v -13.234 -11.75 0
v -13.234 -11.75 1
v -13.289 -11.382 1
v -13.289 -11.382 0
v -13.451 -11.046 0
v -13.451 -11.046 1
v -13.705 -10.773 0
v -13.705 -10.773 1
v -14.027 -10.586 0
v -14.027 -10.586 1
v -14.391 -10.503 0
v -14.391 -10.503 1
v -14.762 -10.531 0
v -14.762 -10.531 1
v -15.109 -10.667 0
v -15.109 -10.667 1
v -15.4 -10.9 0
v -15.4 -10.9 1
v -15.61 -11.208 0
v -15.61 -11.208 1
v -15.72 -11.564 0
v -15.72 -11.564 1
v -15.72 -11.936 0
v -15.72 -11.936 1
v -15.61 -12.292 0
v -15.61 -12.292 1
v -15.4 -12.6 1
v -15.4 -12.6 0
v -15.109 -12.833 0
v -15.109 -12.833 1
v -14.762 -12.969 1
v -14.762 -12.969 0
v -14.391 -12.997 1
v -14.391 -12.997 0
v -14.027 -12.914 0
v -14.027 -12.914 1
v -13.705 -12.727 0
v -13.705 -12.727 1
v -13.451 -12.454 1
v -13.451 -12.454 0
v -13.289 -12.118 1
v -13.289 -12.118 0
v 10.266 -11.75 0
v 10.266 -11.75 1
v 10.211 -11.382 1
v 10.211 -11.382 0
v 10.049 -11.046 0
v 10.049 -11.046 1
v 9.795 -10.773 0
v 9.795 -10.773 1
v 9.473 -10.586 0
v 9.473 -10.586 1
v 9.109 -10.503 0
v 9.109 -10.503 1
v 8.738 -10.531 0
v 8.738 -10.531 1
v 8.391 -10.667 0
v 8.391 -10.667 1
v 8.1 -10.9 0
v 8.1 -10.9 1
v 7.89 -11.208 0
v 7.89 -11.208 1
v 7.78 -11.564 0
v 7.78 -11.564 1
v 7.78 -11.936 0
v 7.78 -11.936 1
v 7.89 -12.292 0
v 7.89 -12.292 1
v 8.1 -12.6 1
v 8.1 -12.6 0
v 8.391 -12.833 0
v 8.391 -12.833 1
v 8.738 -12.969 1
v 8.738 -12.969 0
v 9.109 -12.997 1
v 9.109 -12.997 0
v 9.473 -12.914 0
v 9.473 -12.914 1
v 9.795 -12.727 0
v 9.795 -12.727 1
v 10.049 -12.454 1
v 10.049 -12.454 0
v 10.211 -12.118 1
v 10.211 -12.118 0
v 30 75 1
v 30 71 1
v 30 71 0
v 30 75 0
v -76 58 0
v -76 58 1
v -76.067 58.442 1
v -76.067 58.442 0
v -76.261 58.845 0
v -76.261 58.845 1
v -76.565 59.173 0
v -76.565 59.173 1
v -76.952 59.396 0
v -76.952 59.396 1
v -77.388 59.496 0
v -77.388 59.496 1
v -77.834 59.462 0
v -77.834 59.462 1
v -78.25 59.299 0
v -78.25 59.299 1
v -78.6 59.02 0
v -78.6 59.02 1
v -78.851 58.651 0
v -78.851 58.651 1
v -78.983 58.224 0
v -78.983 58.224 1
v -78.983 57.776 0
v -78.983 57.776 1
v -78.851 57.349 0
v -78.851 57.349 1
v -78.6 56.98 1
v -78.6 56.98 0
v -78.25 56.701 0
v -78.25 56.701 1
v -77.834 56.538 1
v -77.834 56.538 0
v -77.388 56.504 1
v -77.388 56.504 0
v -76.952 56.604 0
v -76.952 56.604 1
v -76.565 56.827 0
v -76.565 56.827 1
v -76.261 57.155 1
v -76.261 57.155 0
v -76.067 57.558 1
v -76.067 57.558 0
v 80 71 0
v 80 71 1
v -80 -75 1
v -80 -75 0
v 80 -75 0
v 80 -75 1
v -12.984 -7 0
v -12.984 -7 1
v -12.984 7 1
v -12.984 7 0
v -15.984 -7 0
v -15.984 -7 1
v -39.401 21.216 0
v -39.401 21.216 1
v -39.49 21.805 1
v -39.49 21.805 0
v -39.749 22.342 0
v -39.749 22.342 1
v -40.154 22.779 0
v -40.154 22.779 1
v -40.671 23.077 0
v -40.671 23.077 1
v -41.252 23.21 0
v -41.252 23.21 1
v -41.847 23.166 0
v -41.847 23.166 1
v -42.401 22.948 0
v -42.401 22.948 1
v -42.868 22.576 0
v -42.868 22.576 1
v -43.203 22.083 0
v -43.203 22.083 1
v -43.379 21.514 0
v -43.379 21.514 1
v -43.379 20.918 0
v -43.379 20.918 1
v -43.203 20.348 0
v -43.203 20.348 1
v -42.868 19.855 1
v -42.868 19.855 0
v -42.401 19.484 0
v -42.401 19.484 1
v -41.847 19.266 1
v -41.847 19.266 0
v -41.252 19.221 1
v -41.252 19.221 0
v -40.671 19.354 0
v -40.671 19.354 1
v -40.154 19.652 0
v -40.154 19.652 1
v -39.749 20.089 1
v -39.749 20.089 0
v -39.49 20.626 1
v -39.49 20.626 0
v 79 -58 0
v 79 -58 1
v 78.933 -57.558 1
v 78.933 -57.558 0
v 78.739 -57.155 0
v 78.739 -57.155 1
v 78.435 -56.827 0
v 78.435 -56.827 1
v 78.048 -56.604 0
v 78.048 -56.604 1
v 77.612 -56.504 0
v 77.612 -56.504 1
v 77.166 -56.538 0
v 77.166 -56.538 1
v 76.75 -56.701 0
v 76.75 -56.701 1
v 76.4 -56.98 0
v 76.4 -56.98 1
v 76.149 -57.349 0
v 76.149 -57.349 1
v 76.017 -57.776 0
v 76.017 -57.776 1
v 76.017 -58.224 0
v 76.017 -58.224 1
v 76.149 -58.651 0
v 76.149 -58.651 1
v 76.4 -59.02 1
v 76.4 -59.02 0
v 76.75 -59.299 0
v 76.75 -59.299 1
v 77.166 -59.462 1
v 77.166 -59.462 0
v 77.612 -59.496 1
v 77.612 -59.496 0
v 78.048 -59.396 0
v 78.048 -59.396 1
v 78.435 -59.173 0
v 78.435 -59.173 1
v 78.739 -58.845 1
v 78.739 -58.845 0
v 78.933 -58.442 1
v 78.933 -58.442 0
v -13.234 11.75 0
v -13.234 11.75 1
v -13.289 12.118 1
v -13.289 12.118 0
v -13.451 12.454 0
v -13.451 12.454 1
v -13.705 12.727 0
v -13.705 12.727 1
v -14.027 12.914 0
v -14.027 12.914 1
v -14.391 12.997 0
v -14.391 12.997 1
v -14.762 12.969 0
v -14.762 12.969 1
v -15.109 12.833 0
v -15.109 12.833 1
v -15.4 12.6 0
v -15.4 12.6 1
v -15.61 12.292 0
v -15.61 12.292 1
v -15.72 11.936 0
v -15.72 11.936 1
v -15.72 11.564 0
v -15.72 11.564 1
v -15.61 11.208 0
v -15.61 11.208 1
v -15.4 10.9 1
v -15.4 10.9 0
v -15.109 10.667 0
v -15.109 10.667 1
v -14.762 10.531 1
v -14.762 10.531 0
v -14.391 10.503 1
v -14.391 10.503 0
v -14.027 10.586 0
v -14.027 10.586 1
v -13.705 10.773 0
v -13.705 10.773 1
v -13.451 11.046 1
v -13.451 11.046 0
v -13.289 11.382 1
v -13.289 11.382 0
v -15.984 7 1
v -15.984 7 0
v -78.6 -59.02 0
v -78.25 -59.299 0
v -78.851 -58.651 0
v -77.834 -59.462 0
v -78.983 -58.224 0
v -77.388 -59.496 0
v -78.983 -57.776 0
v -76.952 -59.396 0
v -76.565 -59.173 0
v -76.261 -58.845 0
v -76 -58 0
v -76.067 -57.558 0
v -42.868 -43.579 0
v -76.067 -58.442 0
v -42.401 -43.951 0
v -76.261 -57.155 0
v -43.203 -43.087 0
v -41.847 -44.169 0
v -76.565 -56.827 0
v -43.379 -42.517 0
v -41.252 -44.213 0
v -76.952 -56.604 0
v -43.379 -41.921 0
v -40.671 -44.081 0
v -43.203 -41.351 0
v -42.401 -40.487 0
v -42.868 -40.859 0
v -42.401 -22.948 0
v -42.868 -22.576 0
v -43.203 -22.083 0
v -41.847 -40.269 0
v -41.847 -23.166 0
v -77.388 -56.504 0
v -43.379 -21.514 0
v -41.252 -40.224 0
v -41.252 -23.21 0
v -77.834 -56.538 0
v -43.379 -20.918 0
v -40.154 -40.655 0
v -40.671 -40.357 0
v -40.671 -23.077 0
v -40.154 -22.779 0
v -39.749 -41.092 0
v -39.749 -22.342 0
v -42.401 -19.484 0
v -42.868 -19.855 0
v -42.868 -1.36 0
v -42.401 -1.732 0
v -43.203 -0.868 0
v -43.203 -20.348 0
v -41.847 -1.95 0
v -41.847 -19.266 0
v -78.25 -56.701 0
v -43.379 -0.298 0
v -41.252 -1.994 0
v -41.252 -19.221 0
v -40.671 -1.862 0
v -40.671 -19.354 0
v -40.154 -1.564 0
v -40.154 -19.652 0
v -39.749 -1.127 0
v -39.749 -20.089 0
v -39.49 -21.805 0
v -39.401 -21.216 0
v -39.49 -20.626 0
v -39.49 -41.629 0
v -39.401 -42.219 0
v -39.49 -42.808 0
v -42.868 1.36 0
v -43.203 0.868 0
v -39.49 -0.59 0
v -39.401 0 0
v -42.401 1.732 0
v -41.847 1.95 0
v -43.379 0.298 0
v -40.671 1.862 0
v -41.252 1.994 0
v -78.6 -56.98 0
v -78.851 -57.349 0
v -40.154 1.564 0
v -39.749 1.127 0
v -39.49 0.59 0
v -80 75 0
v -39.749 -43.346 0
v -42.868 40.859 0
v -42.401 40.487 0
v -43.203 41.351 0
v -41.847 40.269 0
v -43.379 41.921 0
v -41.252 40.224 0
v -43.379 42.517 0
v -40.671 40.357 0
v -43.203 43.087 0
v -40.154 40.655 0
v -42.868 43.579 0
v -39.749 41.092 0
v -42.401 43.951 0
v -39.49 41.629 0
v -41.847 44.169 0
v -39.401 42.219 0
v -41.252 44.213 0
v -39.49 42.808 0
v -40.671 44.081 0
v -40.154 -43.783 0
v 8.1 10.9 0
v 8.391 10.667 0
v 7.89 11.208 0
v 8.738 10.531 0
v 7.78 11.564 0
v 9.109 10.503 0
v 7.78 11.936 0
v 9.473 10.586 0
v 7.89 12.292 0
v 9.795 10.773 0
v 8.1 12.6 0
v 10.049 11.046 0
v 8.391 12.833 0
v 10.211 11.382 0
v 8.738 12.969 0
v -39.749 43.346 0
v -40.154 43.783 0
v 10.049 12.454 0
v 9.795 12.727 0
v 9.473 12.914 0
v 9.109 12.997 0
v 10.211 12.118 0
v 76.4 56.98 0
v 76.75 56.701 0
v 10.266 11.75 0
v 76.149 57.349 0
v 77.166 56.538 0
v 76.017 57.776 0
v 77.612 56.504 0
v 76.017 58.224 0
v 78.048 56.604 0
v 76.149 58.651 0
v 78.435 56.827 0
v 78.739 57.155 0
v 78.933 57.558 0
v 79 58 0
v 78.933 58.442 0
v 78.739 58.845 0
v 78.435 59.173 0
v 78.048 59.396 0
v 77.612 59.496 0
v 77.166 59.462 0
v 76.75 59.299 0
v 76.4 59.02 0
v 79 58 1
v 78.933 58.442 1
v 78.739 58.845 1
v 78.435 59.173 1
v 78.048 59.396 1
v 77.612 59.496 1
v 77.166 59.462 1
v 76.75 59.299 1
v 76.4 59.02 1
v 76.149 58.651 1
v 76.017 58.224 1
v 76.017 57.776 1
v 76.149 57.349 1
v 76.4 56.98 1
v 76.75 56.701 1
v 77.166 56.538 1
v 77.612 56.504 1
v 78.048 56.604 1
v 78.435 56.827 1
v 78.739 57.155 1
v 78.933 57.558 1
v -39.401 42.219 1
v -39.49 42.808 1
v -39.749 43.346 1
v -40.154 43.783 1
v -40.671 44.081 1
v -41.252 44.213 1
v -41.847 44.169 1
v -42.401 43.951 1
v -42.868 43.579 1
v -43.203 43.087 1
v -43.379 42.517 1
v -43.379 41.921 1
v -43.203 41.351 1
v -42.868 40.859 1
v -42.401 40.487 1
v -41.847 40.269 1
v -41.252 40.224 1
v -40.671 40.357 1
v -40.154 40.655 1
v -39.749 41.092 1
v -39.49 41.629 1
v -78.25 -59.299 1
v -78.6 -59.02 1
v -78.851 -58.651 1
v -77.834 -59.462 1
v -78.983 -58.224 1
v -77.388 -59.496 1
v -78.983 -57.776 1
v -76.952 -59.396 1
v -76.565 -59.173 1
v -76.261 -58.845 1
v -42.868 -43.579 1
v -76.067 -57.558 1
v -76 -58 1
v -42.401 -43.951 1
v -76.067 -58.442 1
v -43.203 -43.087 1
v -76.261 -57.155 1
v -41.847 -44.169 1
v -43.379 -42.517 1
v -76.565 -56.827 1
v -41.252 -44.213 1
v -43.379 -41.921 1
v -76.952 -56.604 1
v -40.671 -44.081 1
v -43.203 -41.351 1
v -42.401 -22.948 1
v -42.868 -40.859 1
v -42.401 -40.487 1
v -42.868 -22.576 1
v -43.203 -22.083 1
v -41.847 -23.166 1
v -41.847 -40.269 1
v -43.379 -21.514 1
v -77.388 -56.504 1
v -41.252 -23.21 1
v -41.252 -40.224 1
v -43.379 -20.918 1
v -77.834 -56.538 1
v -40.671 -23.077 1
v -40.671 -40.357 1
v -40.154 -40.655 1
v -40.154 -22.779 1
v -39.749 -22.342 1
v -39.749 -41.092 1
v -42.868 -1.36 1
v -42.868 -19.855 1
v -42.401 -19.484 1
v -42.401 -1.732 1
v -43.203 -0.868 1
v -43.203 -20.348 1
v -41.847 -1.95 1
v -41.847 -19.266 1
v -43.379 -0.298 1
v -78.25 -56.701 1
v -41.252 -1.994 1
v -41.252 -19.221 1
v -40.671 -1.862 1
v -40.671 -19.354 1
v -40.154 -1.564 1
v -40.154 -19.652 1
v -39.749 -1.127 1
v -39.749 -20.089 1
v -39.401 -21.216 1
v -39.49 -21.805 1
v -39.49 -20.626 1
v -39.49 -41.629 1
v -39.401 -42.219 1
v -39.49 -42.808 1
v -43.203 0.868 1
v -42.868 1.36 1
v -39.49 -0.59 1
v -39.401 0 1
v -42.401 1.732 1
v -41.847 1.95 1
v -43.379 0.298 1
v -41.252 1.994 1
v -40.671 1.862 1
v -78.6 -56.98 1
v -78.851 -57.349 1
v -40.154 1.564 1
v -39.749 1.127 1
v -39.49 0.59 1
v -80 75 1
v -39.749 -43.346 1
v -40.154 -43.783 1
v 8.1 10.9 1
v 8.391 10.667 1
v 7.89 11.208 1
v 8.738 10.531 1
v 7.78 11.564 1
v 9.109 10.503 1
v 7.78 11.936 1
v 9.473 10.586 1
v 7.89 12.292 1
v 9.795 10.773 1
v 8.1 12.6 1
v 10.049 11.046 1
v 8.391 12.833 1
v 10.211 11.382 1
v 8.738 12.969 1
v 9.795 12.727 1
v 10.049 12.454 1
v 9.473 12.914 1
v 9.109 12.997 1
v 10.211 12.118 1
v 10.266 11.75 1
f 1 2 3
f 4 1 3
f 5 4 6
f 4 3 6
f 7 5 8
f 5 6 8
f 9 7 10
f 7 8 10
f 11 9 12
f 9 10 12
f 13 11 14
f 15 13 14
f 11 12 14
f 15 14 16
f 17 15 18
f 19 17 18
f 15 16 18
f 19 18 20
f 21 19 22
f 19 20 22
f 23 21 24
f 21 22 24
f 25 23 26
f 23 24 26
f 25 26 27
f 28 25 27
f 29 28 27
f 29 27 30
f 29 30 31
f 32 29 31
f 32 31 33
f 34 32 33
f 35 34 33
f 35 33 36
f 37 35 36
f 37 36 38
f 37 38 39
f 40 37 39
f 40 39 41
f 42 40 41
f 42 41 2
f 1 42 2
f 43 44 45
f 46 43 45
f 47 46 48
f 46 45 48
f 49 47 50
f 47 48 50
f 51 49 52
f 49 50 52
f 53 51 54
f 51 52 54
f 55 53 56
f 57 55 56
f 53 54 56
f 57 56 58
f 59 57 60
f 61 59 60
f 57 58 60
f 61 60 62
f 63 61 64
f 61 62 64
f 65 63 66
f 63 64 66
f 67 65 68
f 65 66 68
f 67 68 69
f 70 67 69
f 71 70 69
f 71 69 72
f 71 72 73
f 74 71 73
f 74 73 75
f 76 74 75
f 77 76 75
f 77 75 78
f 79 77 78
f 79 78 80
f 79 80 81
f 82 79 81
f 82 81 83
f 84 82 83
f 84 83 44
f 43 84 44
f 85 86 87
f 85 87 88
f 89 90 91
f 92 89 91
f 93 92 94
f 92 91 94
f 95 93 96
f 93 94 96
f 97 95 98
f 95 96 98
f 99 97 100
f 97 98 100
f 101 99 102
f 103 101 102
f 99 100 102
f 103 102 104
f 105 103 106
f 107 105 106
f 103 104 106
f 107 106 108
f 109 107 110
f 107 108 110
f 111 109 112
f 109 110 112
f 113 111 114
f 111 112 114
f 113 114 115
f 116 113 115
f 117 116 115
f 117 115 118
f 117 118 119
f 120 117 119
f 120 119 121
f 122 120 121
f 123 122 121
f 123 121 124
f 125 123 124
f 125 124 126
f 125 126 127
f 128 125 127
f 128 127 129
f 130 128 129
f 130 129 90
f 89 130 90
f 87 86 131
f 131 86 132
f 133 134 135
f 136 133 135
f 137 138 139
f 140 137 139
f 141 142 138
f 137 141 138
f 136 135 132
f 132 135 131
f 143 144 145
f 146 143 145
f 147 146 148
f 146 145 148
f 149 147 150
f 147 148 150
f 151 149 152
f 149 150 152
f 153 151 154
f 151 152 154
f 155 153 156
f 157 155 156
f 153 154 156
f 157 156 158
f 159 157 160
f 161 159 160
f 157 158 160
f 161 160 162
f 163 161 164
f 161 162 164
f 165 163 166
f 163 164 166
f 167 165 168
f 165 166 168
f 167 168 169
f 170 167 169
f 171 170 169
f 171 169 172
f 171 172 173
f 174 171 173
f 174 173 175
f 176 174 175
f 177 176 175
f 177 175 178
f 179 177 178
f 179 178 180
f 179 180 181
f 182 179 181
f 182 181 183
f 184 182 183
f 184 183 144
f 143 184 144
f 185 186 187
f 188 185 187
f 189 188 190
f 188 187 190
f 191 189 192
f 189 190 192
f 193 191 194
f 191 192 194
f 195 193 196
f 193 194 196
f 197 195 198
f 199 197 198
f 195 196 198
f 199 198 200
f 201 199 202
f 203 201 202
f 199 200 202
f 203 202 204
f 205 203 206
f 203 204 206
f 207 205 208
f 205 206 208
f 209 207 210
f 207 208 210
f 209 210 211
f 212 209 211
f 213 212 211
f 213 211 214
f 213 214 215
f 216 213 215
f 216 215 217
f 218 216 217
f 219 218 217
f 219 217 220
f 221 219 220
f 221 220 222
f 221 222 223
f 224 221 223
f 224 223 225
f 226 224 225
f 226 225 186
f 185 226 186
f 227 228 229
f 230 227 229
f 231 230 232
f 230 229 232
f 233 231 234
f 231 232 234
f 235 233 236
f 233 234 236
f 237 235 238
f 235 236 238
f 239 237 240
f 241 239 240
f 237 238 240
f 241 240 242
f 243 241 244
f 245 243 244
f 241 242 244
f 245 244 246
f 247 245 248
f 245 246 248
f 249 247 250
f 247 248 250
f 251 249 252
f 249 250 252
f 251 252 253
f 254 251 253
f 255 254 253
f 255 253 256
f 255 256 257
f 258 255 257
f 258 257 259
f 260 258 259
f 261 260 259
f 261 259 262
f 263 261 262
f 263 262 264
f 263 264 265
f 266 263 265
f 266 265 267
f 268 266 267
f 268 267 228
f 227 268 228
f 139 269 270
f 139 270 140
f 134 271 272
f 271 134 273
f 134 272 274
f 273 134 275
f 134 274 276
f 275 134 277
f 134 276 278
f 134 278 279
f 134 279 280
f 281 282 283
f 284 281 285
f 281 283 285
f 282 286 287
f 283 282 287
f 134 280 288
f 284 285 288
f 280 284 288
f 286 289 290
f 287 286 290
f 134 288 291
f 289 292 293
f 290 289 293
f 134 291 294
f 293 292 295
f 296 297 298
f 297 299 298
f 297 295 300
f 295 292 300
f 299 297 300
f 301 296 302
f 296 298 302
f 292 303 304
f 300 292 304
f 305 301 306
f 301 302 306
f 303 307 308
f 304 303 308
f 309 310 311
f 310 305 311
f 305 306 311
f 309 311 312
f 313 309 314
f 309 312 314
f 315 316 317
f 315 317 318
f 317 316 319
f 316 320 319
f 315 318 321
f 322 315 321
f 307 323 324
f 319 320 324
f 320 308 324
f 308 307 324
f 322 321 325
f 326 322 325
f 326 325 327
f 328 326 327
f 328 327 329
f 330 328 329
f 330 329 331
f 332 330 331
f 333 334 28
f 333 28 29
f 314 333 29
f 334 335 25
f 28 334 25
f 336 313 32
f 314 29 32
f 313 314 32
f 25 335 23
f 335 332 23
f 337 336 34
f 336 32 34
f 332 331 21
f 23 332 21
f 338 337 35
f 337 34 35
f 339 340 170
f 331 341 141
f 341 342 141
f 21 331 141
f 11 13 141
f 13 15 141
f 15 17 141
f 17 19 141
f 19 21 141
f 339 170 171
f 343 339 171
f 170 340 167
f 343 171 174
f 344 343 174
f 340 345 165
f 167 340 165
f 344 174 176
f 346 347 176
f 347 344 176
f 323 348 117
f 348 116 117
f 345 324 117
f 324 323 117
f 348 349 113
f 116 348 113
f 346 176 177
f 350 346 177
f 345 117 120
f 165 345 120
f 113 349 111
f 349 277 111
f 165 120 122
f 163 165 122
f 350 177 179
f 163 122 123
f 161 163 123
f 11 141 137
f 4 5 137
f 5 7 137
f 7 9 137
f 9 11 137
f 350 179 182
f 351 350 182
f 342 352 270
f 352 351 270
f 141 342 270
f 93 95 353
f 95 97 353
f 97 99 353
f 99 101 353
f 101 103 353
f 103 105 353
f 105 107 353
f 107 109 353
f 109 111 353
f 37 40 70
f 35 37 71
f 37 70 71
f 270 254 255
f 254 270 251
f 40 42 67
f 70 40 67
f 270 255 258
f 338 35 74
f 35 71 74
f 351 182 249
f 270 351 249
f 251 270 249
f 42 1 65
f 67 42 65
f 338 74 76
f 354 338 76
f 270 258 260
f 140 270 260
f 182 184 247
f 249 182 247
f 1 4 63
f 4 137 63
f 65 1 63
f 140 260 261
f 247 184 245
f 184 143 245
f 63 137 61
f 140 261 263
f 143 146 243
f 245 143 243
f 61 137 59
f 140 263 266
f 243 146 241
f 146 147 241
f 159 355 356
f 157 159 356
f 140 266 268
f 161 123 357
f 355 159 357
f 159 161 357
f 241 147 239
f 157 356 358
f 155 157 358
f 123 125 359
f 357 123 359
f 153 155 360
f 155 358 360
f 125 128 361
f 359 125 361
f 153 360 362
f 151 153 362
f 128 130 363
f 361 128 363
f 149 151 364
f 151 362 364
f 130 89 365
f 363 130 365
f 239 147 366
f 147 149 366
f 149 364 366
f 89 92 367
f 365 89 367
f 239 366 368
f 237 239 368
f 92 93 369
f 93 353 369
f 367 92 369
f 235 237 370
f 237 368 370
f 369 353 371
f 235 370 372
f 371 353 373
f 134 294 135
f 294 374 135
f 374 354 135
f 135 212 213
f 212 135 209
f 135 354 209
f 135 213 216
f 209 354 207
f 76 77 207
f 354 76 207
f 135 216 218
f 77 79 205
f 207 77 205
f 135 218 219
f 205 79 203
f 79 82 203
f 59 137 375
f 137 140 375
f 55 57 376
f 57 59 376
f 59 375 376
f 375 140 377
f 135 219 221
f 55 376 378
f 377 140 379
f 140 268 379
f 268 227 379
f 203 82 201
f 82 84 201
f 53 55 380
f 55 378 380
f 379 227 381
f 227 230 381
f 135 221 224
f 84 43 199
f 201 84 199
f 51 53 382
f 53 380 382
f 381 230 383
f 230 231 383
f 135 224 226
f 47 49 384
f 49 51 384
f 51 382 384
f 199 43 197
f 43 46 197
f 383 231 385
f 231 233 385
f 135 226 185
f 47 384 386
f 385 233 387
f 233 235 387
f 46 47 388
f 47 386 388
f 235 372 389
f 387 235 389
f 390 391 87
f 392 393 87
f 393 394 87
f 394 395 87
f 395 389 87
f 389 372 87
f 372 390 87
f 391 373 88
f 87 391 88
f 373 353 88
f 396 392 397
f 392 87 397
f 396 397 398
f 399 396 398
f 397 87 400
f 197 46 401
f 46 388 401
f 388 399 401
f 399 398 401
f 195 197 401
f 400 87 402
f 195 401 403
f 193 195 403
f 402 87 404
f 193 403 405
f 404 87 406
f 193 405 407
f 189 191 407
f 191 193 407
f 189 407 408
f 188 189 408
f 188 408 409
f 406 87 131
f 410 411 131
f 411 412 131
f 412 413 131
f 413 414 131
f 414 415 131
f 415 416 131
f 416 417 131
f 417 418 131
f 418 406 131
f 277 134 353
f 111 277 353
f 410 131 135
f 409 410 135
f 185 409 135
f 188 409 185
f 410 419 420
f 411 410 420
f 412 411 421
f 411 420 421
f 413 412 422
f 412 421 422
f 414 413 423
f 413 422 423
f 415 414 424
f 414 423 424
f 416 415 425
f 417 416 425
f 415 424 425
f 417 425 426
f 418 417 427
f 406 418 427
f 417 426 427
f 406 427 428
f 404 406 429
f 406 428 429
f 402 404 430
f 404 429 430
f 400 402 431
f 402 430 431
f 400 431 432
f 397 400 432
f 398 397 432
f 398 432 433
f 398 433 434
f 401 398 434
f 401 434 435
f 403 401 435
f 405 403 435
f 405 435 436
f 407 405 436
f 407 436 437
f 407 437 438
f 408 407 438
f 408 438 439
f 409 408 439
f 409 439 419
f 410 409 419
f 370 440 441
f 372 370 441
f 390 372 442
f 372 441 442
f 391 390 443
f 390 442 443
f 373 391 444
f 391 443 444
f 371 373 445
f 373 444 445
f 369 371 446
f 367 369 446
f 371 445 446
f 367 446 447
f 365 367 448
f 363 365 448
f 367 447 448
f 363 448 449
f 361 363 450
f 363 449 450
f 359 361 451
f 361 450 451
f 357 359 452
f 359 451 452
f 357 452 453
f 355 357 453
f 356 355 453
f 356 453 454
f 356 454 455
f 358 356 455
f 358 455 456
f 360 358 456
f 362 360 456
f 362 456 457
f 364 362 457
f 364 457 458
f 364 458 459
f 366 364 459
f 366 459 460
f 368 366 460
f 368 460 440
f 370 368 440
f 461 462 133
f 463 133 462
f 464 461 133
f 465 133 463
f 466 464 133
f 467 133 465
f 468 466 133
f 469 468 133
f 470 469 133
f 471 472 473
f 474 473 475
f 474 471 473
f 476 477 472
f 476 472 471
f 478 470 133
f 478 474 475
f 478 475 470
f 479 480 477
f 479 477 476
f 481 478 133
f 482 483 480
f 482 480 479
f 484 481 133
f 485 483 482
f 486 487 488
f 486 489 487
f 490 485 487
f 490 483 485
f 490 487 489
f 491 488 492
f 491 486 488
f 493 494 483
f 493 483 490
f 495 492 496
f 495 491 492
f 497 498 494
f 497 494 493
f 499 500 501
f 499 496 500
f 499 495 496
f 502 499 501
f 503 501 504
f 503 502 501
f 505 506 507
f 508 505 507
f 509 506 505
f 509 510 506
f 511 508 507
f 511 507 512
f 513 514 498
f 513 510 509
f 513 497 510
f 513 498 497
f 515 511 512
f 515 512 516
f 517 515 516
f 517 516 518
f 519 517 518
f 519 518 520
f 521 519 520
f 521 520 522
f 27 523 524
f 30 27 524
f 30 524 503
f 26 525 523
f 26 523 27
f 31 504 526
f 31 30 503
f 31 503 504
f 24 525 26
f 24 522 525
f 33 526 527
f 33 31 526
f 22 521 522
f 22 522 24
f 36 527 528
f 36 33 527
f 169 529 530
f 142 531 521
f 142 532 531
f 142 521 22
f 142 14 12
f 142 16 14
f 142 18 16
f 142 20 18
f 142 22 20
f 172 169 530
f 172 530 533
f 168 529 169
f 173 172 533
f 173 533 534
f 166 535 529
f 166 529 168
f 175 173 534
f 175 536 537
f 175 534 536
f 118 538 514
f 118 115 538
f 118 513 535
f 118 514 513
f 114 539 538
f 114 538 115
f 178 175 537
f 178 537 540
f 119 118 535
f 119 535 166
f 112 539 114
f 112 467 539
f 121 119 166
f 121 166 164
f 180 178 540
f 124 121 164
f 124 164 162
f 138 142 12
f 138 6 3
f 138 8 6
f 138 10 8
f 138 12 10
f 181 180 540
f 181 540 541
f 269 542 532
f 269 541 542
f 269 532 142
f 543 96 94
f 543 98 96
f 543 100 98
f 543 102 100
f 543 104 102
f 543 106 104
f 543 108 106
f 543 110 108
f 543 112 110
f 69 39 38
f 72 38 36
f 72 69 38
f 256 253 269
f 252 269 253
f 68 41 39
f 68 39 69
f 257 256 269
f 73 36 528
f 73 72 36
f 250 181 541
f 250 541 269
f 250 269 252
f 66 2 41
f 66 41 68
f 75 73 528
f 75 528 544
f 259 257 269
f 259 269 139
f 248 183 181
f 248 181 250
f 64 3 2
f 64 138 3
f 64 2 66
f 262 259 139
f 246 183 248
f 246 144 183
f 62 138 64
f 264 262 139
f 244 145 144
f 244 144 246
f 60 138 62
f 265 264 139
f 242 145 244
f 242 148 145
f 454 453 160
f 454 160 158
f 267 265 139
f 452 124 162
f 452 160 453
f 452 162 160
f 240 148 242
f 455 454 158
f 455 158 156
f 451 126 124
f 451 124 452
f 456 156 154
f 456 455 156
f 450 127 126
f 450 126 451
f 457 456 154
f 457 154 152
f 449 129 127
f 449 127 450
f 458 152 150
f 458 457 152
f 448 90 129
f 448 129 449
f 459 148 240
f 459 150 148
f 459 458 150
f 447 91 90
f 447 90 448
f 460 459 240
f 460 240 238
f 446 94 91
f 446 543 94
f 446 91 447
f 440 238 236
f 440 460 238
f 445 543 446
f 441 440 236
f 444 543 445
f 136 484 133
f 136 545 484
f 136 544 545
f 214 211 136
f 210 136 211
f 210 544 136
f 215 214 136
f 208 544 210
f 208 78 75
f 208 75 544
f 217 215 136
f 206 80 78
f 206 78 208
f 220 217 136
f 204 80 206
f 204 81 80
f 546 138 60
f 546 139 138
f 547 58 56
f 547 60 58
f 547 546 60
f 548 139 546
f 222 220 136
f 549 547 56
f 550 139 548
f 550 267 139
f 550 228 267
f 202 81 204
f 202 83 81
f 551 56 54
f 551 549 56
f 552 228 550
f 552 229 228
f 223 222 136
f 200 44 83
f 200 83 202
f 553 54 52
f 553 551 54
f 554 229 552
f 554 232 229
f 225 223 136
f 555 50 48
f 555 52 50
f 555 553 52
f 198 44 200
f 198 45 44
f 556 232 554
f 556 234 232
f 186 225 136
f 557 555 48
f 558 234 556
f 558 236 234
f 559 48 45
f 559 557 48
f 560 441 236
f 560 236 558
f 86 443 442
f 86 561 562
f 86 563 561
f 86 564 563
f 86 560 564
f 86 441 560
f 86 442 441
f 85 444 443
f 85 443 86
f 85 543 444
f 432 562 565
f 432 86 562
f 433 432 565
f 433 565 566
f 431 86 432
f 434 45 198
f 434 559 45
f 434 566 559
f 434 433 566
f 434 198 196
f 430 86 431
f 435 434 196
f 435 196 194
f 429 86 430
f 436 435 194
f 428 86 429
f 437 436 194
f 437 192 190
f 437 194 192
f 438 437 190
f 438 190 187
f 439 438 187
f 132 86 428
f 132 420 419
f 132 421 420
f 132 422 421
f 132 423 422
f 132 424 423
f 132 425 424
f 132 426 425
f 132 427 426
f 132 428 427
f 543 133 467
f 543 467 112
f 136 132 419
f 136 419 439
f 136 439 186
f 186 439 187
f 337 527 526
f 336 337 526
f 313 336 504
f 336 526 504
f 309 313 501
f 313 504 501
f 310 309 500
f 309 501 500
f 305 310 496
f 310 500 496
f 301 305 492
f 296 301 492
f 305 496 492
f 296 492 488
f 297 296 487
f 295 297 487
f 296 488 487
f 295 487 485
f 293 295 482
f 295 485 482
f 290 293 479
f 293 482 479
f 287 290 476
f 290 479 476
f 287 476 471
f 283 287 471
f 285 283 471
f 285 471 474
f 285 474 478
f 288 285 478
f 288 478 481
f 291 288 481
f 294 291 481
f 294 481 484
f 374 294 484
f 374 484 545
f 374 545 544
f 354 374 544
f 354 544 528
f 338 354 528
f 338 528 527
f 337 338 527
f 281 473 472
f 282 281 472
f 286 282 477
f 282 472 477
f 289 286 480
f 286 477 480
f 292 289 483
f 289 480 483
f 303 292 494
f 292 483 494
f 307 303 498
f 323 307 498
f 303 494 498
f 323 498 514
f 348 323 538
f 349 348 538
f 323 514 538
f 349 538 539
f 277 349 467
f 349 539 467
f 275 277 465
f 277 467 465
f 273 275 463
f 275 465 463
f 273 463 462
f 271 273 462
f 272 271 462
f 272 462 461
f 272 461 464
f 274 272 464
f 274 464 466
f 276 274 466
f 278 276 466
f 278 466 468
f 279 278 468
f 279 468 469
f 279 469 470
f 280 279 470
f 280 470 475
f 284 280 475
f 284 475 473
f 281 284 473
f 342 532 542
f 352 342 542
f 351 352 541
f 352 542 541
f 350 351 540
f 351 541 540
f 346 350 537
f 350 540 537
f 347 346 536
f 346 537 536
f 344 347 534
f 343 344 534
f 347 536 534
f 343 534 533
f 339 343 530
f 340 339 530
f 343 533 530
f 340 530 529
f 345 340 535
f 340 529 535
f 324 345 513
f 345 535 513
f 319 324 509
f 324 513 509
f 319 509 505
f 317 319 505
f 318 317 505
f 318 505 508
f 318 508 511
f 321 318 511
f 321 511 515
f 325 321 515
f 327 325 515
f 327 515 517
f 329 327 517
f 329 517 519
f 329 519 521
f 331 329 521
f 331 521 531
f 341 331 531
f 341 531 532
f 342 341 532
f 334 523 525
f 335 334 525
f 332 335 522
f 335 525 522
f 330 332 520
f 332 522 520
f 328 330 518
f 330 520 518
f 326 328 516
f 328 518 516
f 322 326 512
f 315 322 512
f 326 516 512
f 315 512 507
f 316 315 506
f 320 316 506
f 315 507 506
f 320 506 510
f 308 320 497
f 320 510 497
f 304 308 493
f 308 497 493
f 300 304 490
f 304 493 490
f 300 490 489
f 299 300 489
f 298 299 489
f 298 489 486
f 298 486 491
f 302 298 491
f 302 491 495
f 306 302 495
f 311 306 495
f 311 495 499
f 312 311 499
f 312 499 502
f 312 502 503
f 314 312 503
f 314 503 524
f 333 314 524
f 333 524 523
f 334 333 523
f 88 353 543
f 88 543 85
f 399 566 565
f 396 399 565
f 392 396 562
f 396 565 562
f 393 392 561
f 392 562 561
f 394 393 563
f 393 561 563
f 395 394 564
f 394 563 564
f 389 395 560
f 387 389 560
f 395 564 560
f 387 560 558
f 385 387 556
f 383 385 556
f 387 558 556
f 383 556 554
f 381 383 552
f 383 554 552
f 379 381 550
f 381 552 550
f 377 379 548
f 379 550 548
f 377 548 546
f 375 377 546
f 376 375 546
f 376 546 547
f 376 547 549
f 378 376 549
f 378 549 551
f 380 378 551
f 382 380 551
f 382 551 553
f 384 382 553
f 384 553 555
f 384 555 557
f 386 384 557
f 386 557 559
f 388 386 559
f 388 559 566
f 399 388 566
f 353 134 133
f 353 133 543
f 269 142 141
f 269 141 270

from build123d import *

# Parameters (mm, degrees)
SKETCH1_W           = 160
SKETCH1_H           = 150
BOSS_EXTRUDE1_DEPTH = 1
SKETCH3_R           = 1.5
SKETCH3_R_2         = 1.25
SKETCH3_R_3         = 2
SKETCH3_W           = 50
SKETCH3_H           = 4
SKETCH3_W_2         = 3
SKETCH3_H_2         = 14
CUT_EXTRUDE1_DEPTH  = 10


with BuildPart() as part:
    # Sketch1 → Boss-Extrude1 (new body)
    with BuildSketch(Plane.XY):
        Rectangle(SKETCH1_W, SKETCH1_H)
    extrude(amount=BOSS_EXTRUDE1_DEPTH)

    # Sketch3 → Cut-Extrude1 (cut)
    with BuildSketch(Plane.XY.offset(1)):
        with Locations((-77.5, -58)):
            Circle(SKETCH3_R)
        with Locations((77.5, -58)):
            Circle(SKETCH3_R)
        with Locations((77.5, 58)):
            Circle(SKETCH3_R)
        with Locations((-77.5, 58)):
            Circle(SKETCH3_R)
        with Locations((-14.483915959, -11.75)):
            Circle(SKETCH3_R_2)
        with Locations((9.016084041, -11.75)):
            Circle(SKETCH3_R_2)
        with Locations((9.016084041, 11.75)):
            Circle(SKETCH3_R_2)
        with Locations((-14.483915959, 11.75)):
            Circle(SKETCH3_R_2)
        with Locations((-41.40147673, 0)):
            Circle(SKETCH3_R_3)
        with Locations((-41.40147673, -21.215676989)):
            Circle(SKETCH3_R_3)
        with Locations((-41.40147673, 21.215676989)):
            Circle(SKETCH3_R_3)
        with Locations((-41.40147673, -42.218866747)):
            Circle(SKETCH3_R_3)
        with Locations((-41.40147673, 42.218866747)):
            Circle(SKETCH3_R_3)
        with Locations((55, 73)):
            Rectangle(SKETCH3_W, SKETCH3_H)
        with Locations((-14.483915959, 0)):
            Rectangle(SKETCH3_W_2, SKETCH3_H_2)
    extrude(amount=-CUT_EXTRUDE1_DEPTH, mode=Mode.SUBTRACT)


solid = part.part
